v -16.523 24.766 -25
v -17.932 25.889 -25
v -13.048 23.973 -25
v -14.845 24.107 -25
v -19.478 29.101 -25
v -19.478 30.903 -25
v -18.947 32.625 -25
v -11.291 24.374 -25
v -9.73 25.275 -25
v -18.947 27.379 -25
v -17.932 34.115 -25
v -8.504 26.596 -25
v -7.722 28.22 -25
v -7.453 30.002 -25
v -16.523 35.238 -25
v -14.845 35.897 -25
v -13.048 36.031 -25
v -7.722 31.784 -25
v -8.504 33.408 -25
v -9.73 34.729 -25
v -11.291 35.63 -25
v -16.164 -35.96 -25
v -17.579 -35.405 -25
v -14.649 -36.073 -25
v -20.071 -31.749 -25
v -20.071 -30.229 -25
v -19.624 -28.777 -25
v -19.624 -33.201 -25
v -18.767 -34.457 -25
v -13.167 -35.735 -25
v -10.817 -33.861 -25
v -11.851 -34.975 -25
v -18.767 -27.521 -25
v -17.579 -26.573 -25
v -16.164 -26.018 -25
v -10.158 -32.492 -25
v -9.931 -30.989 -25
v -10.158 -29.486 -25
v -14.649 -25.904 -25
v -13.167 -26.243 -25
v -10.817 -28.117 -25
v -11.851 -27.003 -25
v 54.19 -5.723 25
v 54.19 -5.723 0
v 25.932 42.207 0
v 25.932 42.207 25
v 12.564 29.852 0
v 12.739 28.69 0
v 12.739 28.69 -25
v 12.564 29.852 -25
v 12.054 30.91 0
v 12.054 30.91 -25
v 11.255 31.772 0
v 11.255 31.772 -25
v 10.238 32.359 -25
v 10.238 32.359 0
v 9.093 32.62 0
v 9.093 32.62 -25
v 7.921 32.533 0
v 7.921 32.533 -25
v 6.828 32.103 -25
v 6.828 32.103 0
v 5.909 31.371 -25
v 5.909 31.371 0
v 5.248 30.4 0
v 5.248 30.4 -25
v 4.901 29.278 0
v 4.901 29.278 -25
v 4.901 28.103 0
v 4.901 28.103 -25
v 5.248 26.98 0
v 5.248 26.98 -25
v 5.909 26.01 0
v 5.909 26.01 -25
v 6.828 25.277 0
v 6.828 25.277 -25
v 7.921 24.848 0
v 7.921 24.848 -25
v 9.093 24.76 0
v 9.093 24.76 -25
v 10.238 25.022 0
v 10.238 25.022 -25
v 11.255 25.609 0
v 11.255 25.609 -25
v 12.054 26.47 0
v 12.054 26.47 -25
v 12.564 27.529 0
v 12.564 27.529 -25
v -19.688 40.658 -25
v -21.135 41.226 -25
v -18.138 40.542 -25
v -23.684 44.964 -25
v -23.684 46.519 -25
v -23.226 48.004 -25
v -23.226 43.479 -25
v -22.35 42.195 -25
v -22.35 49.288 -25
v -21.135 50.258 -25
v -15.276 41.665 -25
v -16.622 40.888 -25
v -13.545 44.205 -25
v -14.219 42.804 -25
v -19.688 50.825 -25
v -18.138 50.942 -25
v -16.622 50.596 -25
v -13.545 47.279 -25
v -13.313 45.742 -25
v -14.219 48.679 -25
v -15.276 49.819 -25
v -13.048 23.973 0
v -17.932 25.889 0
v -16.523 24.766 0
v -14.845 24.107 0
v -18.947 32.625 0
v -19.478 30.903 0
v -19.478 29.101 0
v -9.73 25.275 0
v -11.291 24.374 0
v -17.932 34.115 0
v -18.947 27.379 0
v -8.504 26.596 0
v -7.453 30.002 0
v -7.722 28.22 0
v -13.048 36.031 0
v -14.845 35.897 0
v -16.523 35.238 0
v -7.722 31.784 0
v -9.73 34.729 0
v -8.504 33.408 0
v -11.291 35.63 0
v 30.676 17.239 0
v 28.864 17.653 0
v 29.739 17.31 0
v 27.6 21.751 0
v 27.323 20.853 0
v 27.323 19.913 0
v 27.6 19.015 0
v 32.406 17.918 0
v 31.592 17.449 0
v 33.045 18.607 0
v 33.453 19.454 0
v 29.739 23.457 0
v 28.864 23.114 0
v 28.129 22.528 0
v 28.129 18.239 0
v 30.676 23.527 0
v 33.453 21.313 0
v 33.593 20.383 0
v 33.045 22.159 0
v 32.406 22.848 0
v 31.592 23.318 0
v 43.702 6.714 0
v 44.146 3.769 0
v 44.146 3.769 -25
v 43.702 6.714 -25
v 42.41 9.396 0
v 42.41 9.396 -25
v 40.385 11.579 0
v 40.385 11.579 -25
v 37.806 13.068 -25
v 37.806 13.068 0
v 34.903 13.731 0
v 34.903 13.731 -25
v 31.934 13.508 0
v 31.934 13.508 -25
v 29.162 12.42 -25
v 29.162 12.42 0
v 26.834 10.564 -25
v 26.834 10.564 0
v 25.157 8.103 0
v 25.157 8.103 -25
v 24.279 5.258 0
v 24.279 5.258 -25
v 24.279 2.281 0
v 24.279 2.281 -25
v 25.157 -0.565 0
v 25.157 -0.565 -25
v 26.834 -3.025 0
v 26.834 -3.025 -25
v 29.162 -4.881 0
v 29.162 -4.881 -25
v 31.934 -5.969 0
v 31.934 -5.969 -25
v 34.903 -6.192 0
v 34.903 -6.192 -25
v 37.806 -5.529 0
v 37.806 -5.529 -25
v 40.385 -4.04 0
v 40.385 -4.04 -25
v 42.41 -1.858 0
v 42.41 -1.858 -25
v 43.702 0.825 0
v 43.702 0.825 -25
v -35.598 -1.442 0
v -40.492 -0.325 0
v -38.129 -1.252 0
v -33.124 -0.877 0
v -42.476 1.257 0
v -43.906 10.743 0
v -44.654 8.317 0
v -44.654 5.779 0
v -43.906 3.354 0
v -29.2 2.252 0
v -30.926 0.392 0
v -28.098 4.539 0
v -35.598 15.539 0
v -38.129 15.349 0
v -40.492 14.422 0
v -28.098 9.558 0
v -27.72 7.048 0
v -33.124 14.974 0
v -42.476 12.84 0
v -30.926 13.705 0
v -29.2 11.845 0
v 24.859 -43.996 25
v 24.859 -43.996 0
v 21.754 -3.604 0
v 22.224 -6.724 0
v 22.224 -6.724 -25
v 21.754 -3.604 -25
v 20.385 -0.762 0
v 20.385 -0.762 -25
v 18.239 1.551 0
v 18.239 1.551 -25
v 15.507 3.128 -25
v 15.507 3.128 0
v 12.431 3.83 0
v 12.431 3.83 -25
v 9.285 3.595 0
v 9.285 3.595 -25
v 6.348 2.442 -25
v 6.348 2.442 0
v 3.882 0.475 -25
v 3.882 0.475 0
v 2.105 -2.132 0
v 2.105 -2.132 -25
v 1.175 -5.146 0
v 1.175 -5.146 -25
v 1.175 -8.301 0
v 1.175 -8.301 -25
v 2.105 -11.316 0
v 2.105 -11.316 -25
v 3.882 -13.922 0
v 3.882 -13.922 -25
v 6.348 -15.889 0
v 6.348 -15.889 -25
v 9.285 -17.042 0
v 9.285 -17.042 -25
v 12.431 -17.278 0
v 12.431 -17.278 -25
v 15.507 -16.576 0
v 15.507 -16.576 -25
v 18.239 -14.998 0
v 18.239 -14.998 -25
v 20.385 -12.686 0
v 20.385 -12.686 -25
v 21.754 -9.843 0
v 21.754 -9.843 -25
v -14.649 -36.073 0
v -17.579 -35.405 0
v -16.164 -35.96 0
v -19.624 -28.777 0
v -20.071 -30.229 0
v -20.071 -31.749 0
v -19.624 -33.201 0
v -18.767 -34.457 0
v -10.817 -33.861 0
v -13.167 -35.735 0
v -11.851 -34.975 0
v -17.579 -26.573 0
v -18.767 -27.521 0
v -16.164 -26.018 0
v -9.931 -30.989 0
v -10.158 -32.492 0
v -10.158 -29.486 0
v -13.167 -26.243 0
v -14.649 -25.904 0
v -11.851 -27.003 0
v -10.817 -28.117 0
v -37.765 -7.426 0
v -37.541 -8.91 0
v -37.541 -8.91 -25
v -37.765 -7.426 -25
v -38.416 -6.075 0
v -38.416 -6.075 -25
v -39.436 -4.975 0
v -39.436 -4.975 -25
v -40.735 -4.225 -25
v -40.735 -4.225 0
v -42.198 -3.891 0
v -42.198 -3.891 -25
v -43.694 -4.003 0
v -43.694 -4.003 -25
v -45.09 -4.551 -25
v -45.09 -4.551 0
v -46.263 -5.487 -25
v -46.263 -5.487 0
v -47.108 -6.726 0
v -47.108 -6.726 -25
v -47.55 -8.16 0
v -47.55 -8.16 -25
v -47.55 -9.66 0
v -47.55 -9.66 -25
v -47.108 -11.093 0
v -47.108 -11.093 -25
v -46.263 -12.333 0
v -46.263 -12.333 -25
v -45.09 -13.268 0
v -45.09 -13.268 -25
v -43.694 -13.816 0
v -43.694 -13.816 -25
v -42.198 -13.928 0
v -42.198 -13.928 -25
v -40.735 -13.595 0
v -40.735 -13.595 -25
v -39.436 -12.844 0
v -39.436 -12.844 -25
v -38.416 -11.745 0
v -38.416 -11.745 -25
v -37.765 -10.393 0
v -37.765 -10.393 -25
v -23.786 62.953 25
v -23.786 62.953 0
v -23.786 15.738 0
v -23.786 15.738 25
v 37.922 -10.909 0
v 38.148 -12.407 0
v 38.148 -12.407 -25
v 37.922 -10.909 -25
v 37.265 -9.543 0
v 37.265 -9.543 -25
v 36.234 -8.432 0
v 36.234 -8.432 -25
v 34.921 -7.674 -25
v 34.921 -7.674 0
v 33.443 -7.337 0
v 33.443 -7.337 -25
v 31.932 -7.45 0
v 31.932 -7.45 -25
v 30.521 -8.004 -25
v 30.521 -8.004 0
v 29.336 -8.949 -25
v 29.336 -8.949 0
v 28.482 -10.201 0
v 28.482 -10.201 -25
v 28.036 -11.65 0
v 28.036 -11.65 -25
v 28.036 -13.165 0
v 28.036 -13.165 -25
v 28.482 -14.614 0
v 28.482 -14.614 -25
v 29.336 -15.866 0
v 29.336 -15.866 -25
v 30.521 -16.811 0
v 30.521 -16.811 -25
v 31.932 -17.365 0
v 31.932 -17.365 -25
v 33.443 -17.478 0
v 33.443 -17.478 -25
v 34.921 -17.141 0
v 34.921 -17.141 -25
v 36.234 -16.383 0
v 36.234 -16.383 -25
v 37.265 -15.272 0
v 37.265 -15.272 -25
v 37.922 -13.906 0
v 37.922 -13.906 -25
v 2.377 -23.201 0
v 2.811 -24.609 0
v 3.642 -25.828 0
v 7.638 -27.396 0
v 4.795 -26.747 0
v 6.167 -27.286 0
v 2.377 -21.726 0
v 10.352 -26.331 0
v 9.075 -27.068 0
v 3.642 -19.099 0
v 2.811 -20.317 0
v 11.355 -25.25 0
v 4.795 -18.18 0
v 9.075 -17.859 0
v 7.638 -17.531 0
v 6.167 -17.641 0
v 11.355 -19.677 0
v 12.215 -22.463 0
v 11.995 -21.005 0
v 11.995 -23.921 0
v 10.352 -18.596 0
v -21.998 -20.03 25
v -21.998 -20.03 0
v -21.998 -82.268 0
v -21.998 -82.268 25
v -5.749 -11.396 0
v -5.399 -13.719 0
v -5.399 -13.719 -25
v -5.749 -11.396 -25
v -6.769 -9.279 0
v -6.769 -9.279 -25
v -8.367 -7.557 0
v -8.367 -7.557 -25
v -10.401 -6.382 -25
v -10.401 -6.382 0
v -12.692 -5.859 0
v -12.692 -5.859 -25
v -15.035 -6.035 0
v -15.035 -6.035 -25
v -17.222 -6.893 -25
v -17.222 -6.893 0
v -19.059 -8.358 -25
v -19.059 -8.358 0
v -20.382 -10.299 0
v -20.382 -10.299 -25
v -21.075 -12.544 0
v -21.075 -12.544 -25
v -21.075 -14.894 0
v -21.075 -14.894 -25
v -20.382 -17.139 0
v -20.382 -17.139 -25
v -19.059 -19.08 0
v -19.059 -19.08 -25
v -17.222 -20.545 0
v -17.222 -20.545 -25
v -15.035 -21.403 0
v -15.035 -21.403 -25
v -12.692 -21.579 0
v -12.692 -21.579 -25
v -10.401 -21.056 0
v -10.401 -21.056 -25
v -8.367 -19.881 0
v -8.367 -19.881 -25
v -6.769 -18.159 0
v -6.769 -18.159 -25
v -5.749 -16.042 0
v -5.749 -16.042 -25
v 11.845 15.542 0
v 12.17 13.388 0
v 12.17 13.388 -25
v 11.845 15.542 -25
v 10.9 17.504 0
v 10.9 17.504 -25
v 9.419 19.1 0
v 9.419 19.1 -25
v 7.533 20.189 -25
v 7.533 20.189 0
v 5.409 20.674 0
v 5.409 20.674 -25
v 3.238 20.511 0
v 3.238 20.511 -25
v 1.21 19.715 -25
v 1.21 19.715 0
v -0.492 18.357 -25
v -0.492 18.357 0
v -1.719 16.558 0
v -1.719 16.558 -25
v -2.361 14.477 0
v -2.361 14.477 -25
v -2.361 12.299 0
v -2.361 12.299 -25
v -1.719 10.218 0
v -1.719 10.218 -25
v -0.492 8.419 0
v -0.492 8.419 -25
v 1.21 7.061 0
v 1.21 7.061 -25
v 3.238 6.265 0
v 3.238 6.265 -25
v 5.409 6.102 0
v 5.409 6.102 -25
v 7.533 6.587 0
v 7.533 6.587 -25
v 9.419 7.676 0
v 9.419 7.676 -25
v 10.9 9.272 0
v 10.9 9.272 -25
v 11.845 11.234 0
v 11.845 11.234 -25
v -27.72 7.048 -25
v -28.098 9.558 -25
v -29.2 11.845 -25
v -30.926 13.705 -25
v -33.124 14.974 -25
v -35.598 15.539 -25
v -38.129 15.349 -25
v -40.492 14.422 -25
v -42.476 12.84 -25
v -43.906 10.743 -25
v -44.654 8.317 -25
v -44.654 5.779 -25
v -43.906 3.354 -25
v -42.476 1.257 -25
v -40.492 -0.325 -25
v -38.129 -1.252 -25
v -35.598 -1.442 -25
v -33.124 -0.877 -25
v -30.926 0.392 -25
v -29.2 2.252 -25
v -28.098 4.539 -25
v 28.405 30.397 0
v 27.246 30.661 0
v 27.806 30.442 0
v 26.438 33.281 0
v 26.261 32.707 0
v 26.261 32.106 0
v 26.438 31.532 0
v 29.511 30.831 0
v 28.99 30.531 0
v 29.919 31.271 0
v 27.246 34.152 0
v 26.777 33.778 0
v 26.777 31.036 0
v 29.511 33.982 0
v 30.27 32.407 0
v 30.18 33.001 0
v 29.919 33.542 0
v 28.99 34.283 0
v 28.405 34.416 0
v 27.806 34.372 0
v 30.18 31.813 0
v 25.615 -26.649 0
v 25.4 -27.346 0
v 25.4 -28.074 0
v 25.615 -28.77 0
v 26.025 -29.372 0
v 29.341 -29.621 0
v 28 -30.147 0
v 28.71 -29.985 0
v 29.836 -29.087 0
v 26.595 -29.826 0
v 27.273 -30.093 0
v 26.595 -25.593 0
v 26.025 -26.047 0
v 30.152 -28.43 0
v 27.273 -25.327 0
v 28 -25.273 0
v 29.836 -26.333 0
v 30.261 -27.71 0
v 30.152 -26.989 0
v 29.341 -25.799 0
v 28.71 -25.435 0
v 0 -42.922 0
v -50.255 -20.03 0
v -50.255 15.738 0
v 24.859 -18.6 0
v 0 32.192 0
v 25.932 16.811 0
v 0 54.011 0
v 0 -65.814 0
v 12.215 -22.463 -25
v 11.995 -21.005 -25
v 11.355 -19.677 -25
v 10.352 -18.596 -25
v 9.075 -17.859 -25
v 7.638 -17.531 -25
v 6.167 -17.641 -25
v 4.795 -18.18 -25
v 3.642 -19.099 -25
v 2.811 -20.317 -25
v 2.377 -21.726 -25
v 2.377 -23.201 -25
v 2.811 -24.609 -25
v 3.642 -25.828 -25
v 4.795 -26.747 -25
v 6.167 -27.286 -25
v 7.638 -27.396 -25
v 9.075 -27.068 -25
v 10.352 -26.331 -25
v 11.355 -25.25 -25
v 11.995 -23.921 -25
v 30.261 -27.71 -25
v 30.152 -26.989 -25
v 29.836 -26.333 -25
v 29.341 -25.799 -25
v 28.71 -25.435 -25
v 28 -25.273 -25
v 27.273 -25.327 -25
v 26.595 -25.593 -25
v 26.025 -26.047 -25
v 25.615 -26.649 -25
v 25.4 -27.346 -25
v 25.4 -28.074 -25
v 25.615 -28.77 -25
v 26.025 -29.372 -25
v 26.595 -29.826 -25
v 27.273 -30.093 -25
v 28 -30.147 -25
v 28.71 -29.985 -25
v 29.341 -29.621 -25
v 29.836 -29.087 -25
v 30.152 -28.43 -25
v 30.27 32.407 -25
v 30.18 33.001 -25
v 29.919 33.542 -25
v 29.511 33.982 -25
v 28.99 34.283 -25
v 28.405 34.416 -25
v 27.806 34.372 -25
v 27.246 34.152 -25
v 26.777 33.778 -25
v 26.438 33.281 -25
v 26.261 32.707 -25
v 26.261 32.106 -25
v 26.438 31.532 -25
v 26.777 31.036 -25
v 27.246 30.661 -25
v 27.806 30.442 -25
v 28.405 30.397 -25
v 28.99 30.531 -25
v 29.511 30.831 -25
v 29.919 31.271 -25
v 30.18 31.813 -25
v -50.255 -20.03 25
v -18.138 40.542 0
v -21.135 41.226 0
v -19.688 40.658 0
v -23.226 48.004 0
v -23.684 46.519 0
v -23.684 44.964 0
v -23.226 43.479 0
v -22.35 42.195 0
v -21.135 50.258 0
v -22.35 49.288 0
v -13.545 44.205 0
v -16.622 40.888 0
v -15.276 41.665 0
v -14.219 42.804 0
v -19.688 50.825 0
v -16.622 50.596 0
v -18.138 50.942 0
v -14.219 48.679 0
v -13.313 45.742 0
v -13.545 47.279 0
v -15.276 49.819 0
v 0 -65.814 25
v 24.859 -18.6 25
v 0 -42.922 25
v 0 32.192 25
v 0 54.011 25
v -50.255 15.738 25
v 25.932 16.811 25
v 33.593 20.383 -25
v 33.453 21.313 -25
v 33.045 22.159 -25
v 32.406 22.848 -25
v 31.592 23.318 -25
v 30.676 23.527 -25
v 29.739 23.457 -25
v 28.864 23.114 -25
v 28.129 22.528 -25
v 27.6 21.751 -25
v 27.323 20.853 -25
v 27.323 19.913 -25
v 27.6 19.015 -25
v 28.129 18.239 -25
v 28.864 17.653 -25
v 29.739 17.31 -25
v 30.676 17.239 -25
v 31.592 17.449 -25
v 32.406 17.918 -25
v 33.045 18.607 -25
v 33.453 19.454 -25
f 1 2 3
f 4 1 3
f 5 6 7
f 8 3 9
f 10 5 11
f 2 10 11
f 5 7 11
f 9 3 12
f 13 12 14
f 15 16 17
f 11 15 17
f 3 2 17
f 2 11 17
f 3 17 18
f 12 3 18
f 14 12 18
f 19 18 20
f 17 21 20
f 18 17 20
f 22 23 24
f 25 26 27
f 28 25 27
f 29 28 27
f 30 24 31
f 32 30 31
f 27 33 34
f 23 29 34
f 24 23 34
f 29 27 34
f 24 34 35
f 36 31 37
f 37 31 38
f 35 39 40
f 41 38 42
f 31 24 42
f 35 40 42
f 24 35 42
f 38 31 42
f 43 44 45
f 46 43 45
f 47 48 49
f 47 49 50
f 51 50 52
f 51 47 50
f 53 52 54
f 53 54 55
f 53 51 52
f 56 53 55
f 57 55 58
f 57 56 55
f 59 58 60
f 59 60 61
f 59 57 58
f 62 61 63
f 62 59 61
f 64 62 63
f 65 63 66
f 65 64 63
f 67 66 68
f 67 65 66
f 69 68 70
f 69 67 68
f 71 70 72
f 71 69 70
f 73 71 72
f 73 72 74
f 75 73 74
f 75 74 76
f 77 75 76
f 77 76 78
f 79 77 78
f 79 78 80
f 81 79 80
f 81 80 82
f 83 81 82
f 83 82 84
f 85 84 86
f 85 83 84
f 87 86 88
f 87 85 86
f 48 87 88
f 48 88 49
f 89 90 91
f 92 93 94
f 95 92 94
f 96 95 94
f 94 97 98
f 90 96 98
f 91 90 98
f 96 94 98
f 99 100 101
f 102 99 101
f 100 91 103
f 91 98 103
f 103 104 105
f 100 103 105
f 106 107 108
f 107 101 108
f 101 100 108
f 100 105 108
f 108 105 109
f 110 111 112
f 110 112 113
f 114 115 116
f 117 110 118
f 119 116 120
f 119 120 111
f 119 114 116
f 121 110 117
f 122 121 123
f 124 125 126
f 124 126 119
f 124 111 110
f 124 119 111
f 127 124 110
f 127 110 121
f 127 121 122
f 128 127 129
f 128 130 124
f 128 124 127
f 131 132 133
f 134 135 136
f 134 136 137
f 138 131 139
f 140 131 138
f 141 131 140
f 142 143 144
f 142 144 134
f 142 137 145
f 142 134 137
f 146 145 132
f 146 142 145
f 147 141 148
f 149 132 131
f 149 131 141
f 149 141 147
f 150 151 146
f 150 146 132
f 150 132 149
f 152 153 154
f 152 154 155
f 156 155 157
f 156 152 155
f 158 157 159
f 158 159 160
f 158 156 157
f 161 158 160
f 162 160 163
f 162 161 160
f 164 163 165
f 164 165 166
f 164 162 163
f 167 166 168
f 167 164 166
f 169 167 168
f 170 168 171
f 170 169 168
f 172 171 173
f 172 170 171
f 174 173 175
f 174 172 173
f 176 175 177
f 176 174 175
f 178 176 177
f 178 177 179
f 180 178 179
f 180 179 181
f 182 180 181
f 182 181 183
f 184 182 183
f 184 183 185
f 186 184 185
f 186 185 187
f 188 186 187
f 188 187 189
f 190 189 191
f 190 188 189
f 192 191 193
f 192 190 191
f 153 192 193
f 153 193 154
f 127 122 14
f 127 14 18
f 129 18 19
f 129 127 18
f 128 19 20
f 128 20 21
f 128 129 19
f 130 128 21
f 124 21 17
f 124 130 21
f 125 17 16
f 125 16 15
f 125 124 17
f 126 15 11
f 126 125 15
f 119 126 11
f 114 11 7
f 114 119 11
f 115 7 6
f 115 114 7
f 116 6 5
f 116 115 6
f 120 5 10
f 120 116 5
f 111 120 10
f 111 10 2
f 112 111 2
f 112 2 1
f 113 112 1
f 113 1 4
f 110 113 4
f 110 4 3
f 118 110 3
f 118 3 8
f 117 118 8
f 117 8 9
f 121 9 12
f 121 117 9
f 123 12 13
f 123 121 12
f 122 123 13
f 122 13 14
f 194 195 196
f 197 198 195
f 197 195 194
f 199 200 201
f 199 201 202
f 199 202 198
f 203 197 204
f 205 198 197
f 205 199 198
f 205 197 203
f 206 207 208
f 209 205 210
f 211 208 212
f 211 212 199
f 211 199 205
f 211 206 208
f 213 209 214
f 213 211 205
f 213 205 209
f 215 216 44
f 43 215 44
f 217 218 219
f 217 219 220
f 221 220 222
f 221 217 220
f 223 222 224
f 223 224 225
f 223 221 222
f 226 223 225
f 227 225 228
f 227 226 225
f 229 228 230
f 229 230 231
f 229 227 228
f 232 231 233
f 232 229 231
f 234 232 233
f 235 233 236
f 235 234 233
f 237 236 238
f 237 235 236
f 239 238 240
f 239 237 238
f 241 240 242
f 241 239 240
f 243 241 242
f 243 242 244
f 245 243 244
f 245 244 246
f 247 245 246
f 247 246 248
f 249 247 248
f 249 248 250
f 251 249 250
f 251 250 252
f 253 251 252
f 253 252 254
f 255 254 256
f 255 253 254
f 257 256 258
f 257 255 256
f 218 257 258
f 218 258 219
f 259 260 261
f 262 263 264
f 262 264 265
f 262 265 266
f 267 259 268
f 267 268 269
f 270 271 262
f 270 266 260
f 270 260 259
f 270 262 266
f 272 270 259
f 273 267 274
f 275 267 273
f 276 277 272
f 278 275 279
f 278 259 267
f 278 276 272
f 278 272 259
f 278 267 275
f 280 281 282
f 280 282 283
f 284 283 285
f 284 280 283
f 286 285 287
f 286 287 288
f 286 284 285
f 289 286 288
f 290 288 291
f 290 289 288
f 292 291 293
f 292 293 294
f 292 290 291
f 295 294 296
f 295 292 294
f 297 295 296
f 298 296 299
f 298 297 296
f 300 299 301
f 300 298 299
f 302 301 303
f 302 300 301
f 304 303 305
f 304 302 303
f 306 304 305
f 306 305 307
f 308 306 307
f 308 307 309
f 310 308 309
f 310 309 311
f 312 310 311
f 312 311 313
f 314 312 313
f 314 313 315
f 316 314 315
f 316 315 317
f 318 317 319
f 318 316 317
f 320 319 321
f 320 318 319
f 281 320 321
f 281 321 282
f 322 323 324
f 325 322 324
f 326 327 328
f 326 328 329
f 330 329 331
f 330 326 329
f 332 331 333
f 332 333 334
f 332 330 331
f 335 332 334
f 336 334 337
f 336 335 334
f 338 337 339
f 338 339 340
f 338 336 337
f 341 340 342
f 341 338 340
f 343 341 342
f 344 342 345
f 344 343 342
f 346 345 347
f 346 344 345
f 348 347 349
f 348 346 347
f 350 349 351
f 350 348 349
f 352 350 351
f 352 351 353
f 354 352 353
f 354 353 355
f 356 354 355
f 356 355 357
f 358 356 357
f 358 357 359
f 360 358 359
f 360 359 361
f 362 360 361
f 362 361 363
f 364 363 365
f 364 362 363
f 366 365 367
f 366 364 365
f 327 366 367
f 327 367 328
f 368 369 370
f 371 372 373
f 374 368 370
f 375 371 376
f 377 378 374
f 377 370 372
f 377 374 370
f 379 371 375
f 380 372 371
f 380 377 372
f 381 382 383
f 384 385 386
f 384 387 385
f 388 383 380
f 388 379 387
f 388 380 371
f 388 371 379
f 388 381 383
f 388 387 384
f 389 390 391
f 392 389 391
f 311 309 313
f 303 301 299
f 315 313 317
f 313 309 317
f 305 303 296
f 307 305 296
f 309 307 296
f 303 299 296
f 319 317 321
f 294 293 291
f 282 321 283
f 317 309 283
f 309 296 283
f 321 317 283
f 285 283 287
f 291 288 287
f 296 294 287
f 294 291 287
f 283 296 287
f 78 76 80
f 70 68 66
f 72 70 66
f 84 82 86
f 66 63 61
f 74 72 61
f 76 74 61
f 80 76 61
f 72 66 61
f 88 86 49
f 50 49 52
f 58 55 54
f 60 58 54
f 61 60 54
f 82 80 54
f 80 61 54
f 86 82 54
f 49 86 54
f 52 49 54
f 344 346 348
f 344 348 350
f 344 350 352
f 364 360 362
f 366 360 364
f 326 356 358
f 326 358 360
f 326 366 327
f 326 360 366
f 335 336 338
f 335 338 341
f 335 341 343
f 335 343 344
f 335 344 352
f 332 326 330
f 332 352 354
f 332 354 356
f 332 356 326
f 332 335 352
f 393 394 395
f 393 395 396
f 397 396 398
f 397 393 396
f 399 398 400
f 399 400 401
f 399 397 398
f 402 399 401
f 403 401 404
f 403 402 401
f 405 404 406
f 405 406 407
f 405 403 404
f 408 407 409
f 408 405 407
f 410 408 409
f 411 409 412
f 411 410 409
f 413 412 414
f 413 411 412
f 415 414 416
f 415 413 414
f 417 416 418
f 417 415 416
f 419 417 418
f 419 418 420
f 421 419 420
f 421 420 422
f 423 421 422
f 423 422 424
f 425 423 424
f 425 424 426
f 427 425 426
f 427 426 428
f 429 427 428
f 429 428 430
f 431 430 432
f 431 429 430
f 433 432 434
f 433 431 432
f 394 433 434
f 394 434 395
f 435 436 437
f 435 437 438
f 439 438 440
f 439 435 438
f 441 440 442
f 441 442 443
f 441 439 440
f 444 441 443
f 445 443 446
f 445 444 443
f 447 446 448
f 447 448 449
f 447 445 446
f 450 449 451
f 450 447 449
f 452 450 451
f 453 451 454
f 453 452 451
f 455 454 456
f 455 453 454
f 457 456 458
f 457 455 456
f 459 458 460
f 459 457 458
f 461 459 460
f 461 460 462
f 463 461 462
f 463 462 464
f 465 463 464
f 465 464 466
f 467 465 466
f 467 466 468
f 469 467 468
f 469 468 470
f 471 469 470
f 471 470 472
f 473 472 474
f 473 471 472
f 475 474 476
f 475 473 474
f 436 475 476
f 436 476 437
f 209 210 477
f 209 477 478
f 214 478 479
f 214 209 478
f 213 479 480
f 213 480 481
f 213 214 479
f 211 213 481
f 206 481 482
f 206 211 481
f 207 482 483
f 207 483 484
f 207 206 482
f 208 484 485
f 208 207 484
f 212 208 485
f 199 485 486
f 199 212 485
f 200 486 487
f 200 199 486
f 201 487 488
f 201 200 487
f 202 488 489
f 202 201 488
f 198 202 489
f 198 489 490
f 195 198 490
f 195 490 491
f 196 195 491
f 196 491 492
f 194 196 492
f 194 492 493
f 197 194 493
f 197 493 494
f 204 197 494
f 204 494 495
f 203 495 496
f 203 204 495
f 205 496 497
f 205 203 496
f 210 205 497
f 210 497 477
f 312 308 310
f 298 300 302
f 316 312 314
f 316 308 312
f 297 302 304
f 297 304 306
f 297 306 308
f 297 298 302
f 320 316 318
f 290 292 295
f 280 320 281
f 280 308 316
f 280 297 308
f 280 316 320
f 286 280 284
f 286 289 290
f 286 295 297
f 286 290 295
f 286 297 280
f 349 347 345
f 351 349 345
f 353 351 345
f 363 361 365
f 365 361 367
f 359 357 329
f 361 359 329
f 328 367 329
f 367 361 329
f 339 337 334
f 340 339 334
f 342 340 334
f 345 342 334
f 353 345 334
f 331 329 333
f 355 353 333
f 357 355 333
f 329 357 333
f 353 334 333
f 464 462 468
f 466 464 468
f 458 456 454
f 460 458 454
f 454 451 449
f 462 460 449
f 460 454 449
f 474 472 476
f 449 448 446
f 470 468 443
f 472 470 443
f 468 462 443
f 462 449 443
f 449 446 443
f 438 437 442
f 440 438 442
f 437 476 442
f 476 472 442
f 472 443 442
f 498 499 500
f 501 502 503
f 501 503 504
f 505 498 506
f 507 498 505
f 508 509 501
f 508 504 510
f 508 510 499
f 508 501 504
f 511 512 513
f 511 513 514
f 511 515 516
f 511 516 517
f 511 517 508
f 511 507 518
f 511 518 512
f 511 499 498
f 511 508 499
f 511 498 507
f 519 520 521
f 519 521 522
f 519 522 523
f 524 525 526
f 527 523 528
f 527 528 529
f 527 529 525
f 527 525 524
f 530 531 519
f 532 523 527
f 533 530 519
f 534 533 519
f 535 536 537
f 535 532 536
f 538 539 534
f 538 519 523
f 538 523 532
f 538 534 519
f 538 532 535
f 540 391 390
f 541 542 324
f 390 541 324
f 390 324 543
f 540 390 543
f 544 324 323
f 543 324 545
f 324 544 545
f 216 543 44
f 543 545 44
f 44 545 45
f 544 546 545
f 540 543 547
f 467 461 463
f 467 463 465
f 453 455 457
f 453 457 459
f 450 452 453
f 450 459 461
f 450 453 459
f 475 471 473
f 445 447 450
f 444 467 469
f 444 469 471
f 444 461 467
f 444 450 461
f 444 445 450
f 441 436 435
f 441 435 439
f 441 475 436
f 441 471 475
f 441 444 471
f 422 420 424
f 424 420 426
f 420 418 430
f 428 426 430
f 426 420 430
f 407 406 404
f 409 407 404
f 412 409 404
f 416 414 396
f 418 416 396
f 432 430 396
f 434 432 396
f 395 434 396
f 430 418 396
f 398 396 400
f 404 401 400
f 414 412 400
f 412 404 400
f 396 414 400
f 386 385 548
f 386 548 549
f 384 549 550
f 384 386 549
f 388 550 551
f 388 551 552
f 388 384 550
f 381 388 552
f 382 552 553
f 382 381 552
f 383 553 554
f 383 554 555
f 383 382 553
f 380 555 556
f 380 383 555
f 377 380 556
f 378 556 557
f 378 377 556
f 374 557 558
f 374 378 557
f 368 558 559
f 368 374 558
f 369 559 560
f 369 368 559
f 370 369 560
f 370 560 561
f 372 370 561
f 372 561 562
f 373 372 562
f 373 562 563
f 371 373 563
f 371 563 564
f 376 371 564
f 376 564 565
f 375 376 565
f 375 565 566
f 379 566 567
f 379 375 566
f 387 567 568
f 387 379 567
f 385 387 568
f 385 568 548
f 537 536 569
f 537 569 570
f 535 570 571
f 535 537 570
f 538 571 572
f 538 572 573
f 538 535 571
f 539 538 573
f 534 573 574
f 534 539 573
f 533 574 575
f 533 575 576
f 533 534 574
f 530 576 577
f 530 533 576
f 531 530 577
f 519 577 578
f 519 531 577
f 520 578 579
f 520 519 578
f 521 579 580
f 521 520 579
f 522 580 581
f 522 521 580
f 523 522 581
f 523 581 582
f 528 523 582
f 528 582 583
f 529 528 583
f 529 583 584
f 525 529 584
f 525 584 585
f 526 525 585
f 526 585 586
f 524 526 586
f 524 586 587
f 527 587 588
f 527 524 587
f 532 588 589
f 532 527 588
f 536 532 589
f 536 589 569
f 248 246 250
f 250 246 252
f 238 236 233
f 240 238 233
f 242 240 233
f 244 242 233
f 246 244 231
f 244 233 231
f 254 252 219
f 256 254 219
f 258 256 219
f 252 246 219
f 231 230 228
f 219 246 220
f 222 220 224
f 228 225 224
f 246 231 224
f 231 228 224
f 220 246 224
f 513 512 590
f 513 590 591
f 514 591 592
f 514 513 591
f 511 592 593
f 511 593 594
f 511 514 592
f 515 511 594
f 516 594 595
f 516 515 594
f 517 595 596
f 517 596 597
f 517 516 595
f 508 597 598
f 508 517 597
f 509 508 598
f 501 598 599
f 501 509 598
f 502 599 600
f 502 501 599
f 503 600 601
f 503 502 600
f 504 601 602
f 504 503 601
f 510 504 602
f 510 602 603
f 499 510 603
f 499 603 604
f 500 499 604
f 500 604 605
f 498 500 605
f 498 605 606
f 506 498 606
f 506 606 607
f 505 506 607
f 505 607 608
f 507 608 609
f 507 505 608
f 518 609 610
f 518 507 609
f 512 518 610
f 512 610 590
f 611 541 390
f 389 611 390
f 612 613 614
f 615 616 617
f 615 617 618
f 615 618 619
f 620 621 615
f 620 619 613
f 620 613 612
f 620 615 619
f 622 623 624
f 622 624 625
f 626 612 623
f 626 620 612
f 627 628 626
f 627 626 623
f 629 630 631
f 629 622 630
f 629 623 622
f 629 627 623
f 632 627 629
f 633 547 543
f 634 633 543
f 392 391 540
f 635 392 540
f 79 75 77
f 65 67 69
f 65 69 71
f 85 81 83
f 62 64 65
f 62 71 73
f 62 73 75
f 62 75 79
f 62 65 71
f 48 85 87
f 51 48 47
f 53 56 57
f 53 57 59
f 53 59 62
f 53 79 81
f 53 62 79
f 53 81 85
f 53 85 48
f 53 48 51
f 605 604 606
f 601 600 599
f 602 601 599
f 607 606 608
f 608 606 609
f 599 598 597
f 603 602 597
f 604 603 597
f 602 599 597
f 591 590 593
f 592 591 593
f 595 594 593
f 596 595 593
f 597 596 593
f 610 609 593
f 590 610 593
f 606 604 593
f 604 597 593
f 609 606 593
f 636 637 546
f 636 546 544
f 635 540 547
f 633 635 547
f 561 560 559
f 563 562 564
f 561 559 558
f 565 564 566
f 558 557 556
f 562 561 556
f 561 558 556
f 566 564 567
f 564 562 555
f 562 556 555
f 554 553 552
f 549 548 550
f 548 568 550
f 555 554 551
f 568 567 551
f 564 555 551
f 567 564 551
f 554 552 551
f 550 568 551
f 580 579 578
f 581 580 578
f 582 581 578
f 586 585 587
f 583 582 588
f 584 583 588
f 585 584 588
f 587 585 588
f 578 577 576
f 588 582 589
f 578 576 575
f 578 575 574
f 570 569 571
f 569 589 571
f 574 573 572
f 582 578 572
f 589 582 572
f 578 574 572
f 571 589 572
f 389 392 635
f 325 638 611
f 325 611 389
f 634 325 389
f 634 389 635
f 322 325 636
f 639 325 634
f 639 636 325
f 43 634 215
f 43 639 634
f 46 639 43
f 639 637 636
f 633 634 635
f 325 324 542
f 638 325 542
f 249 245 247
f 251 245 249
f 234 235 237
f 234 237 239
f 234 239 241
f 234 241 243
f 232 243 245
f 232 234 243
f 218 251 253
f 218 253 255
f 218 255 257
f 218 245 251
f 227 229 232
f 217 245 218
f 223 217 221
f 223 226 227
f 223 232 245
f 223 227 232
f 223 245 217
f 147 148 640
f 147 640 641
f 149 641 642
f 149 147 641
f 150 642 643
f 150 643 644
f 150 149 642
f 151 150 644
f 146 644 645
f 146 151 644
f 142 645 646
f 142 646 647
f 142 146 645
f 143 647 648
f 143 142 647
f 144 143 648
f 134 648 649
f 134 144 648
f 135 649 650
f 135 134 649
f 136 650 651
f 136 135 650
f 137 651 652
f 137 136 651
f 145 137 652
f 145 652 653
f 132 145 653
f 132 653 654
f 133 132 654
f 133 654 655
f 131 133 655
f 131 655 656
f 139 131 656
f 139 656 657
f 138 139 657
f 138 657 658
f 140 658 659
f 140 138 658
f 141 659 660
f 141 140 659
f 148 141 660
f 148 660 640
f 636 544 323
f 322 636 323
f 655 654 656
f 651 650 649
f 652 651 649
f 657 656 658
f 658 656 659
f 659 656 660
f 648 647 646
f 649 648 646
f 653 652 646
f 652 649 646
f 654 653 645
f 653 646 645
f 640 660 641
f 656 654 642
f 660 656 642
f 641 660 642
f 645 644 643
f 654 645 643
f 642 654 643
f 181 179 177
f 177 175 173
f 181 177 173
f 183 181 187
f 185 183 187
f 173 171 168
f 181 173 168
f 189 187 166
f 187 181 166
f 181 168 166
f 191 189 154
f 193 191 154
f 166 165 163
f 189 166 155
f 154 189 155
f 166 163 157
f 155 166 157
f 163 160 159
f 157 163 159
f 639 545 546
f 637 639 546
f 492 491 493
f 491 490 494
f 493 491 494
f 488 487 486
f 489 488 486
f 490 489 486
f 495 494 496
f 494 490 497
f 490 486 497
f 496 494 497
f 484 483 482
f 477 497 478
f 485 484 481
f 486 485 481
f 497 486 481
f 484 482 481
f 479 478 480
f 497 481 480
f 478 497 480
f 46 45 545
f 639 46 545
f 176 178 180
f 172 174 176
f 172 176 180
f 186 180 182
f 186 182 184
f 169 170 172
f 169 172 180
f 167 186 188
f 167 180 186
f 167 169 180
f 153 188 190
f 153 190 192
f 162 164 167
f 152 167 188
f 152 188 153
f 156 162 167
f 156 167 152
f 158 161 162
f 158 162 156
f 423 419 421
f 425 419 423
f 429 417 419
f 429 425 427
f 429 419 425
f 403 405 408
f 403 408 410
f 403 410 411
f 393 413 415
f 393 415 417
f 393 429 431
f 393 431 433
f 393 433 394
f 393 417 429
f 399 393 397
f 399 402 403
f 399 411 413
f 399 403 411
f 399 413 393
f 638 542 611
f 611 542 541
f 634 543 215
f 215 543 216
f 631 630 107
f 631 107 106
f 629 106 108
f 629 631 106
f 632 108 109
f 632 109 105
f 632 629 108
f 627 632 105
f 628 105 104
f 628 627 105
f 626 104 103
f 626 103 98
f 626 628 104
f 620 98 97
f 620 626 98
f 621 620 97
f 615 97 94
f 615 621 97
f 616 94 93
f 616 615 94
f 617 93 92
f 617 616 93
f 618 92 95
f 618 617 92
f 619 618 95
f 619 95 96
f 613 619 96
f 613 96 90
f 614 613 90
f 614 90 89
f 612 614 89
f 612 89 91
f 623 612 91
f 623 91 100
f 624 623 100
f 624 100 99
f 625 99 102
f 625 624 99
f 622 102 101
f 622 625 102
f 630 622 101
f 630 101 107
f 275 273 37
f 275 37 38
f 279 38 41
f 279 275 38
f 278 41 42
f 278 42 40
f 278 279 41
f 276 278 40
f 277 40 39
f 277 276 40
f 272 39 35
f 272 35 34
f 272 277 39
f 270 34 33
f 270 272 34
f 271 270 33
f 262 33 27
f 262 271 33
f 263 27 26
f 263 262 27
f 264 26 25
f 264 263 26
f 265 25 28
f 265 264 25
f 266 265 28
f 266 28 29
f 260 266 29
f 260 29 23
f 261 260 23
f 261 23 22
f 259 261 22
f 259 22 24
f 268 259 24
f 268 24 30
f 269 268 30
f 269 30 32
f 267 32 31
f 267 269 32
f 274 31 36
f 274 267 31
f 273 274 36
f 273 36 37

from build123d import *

# Parameters (mm, degrees)
F1_DEPTH = 25
F2_R     = 5.032674
F2_R_2   = 6.046328
F2_R_3   = 2.444084
F2_R_4   = 5.214553
F2_R_5   = 4.946477
F2_R_6   = 9.989097
F2_R_7   = 10.583754
F2_R_8   = 5.098711
F2_R_9   = 7.88193
F2_R_10  = 8.514395
F2_R_11  = 5.084635
F2_R_12  = 7.306134
F2_R_13  = 3.940966
F2_R_14  = 3.152772
F2_R_15  = 2.015443
F3_DEPTH = 25


with BuildPart() as f1:
    # F0 (on Top) → F1 (new body)
    with BuildSketch(Plane.XY):
        Polygon((24.859251, -43.995507), (54.189581, -5.723), (25.932312, 42.207055), (25.932312, 16.811278), (0, 54.01073), (0, 32.191824), (-23.786178, 62.952906), (-23.786178, 15.738217), (-50.255015, 15.738217), (-50.255015, -20.030478), (-21.997744, -20.030478), (-21.997744, -82.268015), (0, -42.922445), (0, -65.814413), (24.859251, -18.59973), align=None)
    extrude(amount=F1_DEPTH)


with BuildPart() as f3:
    # F2 (on Top) → F3 (new body)
    with BuildSketch(Plane.XY):
        with Locations((-42.574011, -8.90974)):
            Circle(F2_R)
        with Locations((-13.499485, 30.002031)):
            Circle(F2_R_2)
        with Locations((27.816946, -27.70981)):
            Circle(F2_R_3)
        with Locations((-18.527411, 45.741625)):
            Circle(F2_R_4)
        with Locations((7.268033, -22.463277)):
            Circle(F2_R_5)
        with Locations((34.156505, 3.769376)):
            Circle(F2_R_6)
        with Locations((11.640143, -6.723685)):
            Circle(F2_R_7)
        with Locations((-15.029724, -30.988893)):
            Circle(F2_R_8)
        with Locations((-13.280881, -13.71906)):
            Circle(F2_R_9)
        with Locations((-36.234453, 7.048458)):
            Circle(F2_R_10)
        with Locations((33.063475, -12.407427)):
            Circle(F2_R_11)
        with Locations((4.863372, 13.388017)):
            Circle(F2_R_12)
        with Locations((8.79827, 28.6904)):
            Circle(F2_R_13)
        with Locations((30.440209, 20.38339)):
            Circle(F2_R_14)
        with Locations((28.254159, 32.406691)):
            Circle(F2_R_15)
    extrude(amount=-F3_DEPTH)


solid = Compound([f1.part, f3.part])
